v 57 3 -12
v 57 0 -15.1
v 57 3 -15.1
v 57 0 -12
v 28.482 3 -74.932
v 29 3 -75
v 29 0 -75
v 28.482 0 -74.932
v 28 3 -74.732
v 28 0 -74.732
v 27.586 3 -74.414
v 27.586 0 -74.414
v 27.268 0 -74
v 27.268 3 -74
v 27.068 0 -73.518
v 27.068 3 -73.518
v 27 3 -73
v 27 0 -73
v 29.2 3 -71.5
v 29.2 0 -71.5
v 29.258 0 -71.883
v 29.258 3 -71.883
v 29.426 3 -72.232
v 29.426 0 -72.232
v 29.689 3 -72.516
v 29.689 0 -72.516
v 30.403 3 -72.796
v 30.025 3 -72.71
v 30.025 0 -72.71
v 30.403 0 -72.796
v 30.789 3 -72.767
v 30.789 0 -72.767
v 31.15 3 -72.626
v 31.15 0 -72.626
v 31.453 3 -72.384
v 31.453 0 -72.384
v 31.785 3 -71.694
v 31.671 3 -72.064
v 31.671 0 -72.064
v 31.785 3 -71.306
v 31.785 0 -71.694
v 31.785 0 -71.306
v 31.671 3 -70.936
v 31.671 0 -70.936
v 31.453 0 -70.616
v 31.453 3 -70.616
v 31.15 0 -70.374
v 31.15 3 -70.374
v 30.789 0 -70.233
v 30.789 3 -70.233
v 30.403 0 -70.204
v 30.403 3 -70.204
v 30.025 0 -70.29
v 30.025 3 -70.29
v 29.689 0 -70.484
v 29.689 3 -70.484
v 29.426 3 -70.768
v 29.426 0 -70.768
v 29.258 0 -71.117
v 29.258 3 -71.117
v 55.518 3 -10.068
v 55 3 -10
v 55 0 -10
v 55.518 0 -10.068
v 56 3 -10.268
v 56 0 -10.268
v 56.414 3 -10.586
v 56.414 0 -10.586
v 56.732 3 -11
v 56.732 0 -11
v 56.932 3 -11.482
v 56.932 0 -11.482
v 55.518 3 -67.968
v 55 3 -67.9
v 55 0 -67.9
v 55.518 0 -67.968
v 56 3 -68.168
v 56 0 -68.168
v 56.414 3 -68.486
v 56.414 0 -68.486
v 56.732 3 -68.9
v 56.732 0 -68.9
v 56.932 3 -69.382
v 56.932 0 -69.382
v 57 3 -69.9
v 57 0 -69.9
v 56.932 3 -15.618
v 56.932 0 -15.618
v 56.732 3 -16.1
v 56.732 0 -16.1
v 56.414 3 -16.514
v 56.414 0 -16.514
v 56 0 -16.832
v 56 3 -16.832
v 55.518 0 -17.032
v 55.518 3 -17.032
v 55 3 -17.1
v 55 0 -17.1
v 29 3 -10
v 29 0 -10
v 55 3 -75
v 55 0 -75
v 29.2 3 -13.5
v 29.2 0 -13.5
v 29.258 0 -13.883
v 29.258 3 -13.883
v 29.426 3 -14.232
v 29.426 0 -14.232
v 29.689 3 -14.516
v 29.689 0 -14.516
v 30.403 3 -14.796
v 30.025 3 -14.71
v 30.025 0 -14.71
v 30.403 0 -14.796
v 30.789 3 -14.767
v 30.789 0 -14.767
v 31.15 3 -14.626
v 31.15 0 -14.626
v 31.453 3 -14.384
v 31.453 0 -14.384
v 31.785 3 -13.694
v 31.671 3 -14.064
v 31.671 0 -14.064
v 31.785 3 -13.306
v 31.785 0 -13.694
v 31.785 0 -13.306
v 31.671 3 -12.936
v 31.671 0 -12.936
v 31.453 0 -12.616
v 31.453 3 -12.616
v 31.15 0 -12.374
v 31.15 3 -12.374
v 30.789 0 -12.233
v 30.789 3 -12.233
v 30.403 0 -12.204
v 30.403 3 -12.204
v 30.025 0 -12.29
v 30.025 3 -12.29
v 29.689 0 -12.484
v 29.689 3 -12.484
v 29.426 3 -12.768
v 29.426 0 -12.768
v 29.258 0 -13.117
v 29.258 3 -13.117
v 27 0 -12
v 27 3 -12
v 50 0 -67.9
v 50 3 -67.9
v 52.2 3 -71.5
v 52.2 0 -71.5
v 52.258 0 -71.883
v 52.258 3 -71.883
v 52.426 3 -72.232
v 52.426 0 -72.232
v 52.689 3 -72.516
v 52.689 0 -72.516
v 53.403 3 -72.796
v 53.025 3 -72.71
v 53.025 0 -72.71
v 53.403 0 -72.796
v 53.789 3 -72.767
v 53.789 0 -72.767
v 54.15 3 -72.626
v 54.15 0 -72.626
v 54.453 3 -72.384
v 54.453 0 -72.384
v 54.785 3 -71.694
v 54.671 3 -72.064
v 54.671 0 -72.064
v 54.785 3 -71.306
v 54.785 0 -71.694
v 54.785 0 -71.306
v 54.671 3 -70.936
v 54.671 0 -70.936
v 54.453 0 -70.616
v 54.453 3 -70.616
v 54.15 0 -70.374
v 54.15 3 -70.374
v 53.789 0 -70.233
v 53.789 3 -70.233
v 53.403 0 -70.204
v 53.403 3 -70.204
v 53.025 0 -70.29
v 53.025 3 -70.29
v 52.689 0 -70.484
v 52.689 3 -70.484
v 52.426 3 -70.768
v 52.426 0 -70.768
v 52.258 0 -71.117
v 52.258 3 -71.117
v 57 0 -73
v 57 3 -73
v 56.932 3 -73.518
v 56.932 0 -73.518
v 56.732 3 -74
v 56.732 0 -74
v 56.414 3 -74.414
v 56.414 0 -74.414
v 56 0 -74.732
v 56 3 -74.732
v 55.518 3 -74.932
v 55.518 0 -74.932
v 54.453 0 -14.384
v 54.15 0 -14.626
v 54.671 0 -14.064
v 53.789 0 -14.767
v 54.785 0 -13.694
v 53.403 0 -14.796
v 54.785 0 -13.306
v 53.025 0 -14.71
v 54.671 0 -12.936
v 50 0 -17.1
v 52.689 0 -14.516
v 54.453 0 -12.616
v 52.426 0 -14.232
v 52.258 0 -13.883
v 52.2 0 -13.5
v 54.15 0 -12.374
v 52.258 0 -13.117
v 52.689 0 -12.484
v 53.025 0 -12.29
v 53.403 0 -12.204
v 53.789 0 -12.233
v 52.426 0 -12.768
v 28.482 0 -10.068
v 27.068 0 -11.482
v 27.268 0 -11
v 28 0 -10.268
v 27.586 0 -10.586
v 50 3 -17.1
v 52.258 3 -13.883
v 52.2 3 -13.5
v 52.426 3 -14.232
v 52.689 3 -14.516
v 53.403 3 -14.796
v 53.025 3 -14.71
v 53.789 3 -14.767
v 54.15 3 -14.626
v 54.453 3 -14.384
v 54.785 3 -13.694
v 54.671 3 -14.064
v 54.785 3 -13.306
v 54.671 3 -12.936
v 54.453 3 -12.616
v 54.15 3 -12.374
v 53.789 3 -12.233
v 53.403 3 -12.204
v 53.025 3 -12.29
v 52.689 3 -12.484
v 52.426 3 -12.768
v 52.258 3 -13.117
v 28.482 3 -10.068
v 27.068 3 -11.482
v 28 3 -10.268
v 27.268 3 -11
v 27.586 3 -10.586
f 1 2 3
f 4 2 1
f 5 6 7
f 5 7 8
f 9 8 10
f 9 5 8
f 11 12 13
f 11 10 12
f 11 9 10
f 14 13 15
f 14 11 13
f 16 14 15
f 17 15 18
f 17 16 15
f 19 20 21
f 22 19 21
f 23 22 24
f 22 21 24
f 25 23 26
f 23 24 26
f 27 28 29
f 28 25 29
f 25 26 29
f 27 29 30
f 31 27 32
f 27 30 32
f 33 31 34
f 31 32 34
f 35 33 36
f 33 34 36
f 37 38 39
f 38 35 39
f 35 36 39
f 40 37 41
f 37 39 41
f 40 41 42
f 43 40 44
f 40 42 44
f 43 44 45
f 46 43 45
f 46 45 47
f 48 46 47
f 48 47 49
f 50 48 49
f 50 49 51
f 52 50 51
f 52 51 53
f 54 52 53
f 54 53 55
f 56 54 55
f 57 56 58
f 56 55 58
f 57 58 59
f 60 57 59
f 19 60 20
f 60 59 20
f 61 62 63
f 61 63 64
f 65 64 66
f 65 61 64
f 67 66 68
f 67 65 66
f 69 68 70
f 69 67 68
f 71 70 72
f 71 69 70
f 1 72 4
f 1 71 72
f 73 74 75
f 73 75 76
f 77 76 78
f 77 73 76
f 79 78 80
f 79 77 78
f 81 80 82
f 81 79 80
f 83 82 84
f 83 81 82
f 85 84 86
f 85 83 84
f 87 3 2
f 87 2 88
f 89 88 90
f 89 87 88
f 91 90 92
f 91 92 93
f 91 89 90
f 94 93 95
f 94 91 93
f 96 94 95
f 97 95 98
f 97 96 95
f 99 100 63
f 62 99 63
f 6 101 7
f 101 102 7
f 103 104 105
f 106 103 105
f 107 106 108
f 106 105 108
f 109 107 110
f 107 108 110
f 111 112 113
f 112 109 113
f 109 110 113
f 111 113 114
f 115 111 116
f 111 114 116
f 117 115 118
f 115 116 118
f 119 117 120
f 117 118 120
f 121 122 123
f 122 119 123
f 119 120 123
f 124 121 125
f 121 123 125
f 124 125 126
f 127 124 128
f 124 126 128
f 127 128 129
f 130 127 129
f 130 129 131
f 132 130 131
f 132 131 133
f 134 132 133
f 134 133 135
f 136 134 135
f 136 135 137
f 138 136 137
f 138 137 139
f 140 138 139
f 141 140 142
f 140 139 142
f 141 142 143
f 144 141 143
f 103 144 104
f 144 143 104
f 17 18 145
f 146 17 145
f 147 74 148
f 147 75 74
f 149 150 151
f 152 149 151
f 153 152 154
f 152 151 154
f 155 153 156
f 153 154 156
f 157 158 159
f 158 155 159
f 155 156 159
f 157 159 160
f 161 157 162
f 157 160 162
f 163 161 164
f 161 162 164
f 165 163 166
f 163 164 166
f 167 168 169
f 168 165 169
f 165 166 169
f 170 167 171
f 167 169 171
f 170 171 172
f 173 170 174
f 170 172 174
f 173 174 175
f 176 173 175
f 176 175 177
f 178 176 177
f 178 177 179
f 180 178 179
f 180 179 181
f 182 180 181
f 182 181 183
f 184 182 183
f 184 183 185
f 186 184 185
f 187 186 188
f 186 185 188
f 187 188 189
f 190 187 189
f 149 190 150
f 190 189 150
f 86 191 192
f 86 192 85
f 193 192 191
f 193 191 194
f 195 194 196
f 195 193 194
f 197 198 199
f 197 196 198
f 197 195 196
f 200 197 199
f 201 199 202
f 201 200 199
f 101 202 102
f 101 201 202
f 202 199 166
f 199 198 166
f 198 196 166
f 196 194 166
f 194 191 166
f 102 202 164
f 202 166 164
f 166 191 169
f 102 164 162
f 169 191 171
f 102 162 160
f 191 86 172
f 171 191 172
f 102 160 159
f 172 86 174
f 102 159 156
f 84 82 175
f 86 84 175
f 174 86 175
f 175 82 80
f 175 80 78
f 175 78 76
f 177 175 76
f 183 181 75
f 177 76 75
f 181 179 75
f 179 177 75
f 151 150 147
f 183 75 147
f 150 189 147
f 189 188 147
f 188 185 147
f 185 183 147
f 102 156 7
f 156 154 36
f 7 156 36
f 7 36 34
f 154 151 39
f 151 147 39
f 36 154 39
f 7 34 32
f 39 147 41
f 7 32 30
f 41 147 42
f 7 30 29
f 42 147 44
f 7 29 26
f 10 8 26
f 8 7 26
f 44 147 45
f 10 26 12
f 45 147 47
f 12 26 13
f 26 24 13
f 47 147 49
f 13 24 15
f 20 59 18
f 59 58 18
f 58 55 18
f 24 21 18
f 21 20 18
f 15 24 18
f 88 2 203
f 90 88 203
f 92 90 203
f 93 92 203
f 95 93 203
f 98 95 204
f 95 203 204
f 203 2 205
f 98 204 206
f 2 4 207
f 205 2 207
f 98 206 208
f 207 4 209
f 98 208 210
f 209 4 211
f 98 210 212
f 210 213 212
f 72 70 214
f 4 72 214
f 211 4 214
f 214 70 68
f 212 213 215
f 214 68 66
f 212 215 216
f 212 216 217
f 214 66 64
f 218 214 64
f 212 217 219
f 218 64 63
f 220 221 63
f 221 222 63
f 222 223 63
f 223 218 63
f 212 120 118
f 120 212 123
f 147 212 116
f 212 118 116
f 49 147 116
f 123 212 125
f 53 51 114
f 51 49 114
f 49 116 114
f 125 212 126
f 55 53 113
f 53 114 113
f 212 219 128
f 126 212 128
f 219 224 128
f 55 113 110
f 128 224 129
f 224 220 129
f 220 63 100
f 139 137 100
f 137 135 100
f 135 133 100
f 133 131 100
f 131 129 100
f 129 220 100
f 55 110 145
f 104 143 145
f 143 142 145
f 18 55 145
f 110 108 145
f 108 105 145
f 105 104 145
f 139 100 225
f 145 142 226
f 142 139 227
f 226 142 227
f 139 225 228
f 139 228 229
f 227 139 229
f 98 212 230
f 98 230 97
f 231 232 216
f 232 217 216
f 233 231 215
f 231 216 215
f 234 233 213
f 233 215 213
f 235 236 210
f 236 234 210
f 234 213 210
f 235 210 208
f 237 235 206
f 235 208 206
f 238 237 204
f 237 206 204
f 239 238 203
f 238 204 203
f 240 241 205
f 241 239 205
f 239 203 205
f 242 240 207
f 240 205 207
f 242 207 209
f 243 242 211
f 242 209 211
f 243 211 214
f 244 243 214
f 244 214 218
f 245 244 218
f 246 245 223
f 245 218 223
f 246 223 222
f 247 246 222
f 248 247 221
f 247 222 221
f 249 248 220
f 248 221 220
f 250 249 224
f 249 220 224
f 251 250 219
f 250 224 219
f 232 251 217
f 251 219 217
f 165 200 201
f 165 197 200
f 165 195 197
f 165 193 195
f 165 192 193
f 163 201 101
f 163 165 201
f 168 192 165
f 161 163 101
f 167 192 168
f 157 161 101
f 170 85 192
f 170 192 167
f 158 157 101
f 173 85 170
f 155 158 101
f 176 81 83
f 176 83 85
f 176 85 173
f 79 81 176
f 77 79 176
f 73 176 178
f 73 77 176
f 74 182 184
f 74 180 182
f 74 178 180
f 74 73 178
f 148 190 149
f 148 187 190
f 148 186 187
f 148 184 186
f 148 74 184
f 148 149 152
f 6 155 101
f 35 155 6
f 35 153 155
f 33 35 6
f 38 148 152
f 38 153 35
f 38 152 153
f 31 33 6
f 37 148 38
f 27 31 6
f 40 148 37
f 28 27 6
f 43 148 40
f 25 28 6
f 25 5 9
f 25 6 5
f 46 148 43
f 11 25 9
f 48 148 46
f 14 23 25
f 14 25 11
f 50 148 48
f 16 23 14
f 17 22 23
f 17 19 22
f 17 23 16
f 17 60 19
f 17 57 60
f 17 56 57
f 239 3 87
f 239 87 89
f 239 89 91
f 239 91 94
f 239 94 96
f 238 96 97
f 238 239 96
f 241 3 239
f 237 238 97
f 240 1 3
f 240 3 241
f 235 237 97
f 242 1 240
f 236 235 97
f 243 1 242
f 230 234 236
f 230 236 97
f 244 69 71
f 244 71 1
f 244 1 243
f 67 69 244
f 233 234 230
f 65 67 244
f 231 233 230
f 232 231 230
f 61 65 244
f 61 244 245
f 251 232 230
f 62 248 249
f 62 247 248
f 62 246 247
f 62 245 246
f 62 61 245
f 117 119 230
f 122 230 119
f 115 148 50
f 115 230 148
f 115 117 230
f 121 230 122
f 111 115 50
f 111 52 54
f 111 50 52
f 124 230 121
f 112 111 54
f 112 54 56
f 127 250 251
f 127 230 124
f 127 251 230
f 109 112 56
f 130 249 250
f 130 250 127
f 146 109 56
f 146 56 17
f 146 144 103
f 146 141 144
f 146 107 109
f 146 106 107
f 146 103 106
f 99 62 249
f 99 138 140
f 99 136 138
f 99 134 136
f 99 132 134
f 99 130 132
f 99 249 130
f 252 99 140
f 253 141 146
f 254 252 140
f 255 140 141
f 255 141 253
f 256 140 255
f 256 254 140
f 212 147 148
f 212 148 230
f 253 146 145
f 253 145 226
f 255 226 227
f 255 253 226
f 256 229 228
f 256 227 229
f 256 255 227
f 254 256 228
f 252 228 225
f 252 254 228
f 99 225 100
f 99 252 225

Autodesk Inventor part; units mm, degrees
ref_plane "YZ Plane" through (0, 0, 0) normal (1, 0, 0) x (0, 1, 0)
ref_plane "XZ Plane" through (0, 0, 0) normal (0, 1, 0) x (-1, 0, 0)
ref_plane "XY Plane" through (0, 0, 0) normal (0, 0, 1) x (1, 0, 0)
sketch "Base" plane through (0, 0, 0) normal (0, 1, 0) x (-1, 0, 0)
  line L0 (0, 0) -> (-117, 0)
  line L1 (-117, 0) -> (-117, -85)
  line L2 (-117, -85) -> (0, -85)
  line L3 (0, -85) -> (0, 0)
  line L4 (-117, -85) -> (-112, -85)
  line L5 (-112, -85) -> (-112, 0)
  line L6 (-112, 0) -> (-117, 0)
  line L7 (-117, 0) -> (-117, -85)
  line L8 (-112, -85) -> (-57, -85)
  line L9 (-57, -85) -> (-57, 0)
  line L10 (-57, 0) -> (-112, 0)
  line L11 (-112, 0) -> (-112, -85)
  line L12 (-57, -75) -> (-27, -75)
  line L13 (-27, -75) -> (-27, -10)
  line L14 (-27, -10) -> (-57, -10)
  line L15 (-57, -10) -> (-57, -75)
  circle A0 centre (-30.5, -71.5) radius 1.3
  circle A1 centre (-53.5, -71.5) radius 1.3
  circle A2 centre (-30.5, -13.5) radius 1.3
  circle A3 centre (-53.5, -13.5) radius 1.3
  line L16 (-27, -85) -> (-27, 0)
  line L17 (0, -83.35) -> (-50, -83.35)
  line L18 (-50, -83.35) -> (-50, -1.65)
  line L19 (-50, -1.65) -> (0, -1.65)
  line L20 (0, -1.65) -> (0, -83.35)
  circle A4 centre (-2.9, -80.45) radius 1.55
  circle A5 centre (-47.1, -80.45) radius 1.55
  circle A6 centre (-47.1, -4.55) radius 1.55
  circle A7 centre (-2.9, -4.55) radius 1.55
  line L21 (-50, -17.1) -> (-57, -17.1)
  line L22 (-57, -17.1) -> (-57, -67.9)
  line L23 (-57, -67.9) -> (-50, -67.9)
  line L24 (-50, -67.9) -> (-50, -17.1)
  line L25 (-50, -17.1) -> (-57, -67.9) construction
  line L26 (-57, -17.1) -> (-50, -67.9) construction
  line L27 (-7.22, -1.65) -> (-42.78, -1.65)
  line L28 (-42.78, -1.65) -> (-42.78, -5.15)
  line L29 (-42.78, -5.15) -> (-7.22, -5.15)
  line L30 (-7.22, -5.15) -> (-7.22, -1.65)
  point P0 (-27, -10)
  point P1 (-53.5, -42.5)
  dimension "d0" = 117
  dimension "d1" = 85
  dimension "d2" = 5
  dimension "d3" = 85
  dimension "d10" = 55
  dimension "d11" = 85
  dimension "d12" = 30
  dimension "d13" = 65
  dimension "d14" = 10
  dimension "d15" = 10
  dimension "d16" = 2.6
  dimension "d17" = 2.6
  dimension "d18" = 2.6
  dimension "d19" = 2.6
  dimension "d20" = 3.5
  dimension "d21" = 3.5
  dimension "d22" = 3.5
  dimension "d23" = 3.5
  dimension "d24" = 3.5
  dimension "d25" = 3.5
  dimension "d26" = 3.5
  dimension "d27" = 3.5
  dimension "d28" = 0
  dimension "d38" = 50
  dimension "d39" = 81.7
  dimension "d40" = 1.65
  dimension "d41" = 1.65
  dimension "d42" = 3.1
  dimension "d43" = 3.1
  dimension "d44" = 3.1
  dimension "d45" = 3.1
  dimension "d46" = 2.9
  dimension "d48" = 2.9
  dimension "d49" = 2.9
  dimension "d50" = 2.9
  dimension "d51" = 2.9
  dimension "d52" = 2.9
  dimension "d53" = 2.9
  dimension "d54" = 50.8
  dimension "d55" = 7
  dimension "d56" = 29
  dimension "d57" = 29
  dimension "d63" = 2.9
  dimension "d64" = 35.56
  dimension "d65" = 3.5
  dimension "d66" = 7.22
  dimension "d67" = 7.22
  dimension "d71" = 44.2
  dimension "d72" = 75.9
extrude "Extrusion4" add sketch "Base" along normal blind 3 contours L14 L18 L21 L9 | L14 L13 L12 L18 | L23 L18 L12 L9
fillet "Fillet6" radius 2 6 edges at (27, 1.5, -10) (57, 1.5, -10) (57, 1.5, -17.1) (57, 1.5, -67.9) (57, 1.5, -75) (27, 1.5, -75)
properties part number "00_BottomPart"
